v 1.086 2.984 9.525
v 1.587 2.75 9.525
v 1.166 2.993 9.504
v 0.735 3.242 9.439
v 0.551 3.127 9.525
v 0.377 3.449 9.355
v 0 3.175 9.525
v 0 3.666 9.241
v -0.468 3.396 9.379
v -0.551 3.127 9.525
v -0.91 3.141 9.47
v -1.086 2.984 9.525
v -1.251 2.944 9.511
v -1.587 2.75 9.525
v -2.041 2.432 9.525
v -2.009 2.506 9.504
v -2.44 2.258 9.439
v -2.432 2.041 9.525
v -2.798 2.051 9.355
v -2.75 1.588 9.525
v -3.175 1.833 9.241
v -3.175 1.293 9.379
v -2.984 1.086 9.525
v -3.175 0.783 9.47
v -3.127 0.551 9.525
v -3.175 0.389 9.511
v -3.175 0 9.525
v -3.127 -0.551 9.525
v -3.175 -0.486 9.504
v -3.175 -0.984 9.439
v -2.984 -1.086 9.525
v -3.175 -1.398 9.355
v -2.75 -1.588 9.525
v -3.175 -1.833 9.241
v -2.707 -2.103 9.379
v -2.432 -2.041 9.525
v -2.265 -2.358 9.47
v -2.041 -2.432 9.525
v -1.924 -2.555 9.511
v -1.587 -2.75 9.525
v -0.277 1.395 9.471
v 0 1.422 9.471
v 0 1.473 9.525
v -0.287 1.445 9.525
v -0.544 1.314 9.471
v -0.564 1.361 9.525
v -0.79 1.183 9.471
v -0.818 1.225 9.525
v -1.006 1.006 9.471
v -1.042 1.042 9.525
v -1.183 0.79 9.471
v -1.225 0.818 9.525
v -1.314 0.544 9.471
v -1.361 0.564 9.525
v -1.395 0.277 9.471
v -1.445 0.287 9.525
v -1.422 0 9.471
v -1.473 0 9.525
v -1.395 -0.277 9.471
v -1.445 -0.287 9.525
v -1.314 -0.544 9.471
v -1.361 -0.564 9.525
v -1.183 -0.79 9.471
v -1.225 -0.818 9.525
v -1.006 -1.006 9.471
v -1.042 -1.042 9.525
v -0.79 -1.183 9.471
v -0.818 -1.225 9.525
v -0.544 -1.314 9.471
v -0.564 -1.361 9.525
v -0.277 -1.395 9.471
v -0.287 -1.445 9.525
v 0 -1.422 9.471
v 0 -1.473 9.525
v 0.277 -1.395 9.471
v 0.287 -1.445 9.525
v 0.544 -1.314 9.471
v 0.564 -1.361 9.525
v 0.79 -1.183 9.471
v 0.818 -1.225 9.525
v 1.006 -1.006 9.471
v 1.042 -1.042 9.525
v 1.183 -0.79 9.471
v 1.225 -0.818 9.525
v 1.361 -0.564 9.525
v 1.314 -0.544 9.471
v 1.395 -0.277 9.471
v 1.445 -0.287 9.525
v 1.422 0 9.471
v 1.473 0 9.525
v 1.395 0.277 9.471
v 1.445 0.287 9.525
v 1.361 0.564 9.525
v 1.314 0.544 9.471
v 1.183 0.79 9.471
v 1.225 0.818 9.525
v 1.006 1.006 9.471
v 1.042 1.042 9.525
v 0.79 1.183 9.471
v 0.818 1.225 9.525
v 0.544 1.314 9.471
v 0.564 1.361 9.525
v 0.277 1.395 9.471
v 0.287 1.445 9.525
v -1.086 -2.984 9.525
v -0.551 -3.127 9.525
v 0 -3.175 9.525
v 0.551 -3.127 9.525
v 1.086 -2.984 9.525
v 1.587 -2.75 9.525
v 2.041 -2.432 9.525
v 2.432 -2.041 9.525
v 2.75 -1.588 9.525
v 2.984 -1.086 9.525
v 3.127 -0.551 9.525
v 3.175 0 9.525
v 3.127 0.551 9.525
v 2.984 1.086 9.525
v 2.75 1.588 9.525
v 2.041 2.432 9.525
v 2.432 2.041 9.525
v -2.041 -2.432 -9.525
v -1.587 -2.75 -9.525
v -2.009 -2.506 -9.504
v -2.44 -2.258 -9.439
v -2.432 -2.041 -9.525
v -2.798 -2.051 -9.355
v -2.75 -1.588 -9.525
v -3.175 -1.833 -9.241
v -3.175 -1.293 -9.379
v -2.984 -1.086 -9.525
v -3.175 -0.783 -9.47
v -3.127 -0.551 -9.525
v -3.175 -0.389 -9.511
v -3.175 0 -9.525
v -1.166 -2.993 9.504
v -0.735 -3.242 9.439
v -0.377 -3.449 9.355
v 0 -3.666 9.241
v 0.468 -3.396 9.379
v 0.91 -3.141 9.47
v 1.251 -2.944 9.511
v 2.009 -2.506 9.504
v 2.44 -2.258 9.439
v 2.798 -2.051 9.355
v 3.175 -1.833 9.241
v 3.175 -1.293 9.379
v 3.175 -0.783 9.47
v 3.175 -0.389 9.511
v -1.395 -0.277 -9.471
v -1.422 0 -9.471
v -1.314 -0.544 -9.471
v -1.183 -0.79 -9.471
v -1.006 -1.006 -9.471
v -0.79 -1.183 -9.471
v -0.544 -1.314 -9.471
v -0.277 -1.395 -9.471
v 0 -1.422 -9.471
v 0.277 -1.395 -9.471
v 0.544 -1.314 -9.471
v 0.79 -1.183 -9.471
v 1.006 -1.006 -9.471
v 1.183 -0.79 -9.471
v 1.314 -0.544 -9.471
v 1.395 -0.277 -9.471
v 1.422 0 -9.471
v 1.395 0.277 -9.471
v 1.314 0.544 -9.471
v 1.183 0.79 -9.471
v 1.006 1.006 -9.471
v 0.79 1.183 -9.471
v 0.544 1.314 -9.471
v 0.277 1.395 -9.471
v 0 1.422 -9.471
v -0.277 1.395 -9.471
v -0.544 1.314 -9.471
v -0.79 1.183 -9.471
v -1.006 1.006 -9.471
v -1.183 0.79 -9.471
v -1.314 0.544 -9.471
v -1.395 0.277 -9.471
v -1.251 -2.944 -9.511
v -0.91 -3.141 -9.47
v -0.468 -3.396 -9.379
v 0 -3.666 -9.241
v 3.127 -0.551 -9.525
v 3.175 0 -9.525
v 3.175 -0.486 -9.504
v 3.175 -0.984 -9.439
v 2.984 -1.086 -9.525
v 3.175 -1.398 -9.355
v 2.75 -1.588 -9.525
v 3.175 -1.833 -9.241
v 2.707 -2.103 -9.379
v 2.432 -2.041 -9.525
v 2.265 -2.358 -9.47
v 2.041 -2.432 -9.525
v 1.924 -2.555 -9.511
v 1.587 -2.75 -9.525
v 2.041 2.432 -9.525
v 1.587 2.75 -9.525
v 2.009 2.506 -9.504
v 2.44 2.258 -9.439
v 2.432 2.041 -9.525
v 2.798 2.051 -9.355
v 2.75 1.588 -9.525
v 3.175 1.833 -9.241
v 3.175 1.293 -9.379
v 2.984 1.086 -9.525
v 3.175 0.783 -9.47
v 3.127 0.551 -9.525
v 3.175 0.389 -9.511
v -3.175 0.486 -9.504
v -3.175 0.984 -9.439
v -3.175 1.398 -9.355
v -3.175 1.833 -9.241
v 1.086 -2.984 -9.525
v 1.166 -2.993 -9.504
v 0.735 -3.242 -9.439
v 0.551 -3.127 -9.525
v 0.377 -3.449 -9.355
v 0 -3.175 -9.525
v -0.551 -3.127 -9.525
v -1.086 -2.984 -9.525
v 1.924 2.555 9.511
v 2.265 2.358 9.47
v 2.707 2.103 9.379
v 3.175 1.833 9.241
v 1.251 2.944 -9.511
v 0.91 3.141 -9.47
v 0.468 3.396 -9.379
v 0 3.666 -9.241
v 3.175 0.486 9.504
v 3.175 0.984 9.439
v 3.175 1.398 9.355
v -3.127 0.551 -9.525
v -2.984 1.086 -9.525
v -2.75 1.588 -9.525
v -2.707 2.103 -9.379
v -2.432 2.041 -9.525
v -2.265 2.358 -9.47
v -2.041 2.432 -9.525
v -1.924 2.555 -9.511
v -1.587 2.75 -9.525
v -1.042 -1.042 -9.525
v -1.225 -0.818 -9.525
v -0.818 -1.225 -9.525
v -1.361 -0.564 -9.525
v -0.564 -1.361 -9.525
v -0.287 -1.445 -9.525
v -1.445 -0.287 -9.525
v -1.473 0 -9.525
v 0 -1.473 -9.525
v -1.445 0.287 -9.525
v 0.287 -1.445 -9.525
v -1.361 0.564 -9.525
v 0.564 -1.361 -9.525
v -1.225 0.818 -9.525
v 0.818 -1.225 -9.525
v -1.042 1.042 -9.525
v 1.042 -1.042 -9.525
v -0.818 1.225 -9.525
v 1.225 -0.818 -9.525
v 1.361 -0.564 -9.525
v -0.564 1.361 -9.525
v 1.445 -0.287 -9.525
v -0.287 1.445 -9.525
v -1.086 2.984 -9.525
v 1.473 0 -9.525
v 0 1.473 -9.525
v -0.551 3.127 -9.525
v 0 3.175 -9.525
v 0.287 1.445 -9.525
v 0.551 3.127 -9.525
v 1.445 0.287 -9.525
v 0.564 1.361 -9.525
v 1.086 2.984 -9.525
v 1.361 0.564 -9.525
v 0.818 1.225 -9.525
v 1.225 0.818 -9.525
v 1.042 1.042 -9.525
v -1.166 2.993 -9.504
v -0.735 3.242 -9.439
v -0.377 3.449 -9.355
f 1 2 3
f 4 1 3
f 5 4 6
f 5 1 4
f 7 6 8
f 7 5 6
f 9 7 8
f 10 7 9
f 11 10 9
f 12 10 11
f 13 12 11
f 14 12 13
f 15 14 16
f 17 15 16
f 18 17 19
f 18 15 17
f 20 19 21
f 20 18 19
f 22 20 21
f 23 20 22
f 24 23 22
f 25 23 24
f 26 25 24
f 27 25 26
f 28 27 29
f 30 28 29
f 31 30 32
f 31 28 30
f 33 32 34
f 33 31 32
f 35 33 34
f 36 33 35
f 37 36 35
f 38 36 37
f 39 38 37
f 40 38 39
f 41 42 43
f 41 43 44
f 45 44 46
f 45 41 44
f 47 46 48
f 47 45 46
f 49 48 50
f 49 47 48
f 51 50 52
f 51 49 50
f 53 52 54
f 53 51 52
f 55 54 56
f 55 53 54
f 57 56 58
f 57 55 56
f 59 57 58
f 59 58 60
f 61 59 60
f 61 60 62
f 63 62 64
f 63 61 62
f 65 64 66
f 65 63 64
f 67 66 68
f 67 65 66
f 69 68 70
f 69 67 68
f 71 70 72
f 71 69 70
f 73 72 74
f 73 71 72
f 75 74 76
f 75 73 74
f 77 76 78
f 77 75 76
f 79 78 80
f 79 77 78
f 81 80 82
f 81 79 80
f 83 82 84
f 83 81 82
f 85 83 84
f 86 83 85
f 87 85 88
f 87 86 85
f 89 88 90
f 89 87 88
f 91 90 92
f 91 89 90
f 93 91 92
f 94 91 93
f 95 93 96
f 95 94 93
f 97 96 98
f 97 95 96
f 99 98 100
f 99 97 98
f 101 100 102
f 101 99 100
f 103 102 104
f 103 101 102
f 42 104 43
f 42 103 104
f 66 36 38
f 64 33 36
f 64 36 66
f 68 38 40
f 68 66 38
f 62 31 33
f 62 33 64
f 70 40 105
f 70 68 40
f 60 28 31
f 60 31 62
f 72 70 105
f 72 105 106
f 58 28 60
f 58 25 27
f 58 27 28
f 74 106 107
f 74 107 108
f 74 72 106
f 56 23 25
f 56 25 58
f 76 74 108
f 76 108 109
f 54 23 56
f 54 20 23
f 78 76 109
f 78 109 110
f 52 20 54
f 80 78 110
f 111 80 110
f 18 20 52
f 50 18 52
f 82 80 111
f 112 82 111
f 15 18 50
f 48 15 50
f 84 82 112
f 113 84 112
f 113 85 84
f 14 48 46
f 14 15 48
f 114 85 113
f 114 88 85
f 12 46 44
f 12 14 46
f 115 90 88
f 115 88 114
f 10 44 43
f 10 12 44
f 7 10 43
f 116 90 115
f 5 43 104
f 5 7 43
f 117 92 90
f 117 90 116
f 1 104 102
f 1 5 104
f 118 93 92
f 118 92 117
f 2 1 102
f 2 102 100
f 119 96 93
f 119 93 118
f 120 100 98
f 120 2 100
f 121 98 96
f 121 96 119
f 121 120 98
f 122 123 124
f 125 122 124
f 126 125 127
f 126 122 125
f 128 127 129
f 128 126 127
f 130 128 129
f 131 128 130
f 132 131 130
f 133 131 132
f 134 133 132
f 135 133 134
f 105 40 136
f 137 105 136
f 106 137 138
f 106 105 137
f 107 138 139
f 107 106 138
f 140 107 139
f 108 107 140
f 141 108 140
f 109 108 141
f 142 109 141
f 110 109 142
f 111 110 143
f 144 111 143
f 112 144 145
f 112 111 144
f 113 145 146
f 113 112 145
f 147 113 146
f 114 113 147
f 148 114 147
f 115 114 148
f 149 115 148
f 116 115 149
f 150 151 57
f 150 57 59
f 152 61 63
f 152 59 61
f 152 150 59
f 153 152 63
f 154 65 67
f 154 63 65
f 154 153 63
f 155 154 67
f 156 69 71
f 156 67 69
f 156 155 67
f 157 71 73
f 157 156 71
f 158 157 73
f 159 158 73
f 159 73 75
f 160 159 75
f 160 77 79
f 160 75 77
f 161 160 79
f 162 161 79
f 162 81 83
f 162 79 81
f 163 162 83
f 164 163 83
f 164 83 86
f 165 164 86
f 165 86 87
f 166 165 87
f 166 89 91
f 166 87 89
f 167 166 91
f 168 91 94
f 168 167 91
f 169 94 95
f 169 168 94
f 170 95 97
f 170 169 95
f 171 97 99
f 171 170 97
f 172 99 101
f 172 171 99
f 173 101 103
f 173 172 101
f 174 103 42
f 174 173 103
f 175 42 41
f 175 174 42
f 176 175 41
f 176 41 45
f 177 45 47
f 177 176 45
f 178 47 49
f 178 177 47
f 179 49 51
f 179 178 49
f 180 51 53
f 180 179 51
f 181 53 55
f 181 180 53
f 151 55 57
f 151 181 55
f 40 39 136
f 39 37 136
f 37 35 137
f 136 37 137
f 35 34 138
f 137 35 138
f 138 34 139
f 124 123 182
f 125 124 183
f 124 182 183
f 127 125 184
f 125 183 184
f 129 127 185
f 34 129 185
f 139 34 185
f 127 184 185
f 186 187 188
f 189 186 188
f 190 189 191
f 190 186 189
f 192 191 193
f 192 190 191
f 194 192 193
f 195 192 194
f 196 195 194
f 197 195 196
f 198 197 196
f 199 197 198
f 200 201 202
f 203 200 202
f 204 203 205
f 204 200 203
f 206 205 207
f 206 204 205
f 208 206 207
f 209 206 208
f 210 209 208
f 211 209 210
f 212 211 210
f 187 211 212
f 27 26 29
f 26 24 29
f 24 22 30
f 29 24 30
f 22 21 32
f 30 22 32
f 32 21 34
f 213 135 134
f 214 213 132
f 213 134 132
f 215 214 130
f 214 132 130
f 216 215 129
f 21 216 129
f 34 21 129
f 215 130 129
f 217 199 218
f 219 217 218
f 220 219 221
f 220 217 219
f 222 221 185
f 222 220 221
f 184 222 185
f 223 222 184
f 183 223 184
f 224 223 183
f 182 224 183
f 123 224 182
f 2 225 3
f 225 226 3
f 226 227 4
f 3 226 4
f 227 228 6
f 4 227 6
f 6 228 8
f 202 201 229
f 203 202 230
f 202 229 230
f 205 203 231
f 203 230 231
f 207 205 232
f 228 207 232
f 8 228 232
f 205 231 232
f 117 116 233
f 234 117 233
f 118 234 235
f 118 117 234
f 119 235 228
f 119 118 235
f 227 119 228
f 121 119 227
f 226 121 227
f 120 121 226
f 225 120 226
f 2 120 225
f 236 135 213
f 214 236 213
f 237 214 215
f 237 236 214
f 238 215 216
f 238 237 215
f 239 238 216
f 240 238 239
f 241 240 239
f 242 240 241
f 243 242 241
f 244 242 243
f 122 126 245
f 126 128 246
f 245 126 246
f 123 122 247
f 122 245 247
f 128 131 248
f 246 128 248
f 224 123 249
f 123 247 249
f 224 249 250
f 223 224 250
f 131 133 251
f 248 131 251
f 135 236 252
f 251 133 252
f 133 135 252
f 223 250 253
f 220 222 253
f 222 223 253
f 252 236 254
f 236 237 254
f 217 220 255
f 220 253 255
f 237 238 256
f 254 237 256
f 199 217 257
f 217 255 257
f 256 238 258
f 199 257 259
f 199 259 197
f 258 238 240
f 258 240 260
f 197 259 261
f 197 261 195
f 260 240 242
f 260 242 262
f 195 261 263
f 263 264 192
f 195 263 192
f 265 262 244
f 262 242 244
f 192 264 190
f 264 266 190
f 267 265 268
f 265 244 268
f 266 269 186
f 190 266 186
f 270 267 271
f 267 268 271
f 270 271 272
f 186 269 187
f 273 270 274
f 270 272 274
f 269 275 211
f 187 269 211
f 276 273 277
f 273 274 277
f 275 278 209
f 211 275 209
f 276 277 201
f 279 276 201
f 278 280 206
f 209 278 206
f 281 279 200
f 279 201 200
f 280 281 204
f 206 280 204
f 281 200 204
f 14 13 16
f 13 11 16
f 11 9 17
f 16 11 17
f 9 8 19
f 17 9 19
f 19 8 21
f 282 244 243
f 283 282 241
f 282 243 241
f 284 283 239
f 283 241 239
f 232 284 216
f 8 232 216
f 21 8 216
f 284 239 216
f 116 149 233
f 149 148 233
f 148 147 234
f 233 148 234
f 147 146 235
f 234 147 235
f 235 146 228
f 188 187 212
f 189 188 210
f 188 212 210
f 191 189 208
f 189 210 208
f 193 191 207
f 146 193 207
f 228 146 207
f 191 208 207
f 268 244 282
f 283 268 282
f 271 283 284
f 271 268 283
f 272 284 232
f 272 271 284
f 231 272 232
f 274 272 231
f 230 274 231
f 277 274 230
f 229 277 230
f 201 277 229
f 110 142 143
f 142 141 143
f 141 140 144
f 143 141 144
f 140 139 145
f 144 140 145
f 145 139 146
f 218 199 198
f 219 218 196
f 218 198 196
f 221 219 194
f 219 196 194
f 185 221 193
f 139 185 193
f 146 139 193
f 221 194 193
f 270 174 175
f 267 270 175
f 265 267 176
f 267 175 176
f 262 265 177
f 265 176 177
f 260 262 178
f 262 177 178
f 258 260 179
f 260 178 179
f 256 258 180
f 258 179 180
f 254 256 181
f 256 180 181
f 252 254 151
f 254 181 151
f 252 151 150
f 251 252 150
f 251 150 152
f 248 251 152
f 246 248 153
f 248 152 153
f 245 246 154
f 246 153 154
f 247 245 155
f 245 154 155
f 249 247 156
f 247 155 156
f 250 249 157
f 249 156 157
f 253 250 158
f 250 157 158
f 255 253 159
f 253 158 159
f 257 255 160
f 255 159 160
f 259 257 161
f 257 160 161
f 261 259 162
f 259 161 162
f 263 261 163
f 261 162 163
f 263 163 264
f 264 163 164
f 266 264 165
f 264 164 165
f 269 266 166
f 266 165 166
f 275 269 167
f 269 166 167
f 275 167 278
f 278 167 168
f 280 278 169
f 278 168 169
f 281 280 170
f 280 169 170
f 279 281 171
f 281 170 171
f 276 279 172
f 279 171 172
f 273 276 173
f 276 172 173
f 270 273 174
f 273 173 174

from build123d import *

# Parameters (mm, degrees)
EXTRUDE1_DEPTH          = 9.525
EXTRUDE1_DEPTH_BACK     = 9.525
SKETCH1_R               = 1.4224
SKETCH8_OUTSIDE_W       = 84.186
SKETCH8_OUTSIDE_H       = 85.168
SKETCH8_OUTSIDE_R       = 3.175
EXTRUDE4_DEPTH          = 20.657669199
EXTRUDE4_DRAFT          = -60
MIRROR1_COPY_1_SKETCH_W = 84.186
MIRROR1_COPY_1_SKETCH_H = 85.168
MIRROR1_COPY_1_SKETCH_R = 3.175
MIRROR1_COPY_1_DEPTH    = 20.657669199
MIRROR1_COPY_1_DRAFT    = -60


with BuildPart() as part:
    # Sketch1 → Extrude1 (new, two sides: drawn at the far end of the back side and taken through both)
    with BuildSketch(Plane.XY.offset(-EXTRUDE1_DEPTH_BACK)):
        Polygon((0, 3.666174209), (-3.175, 1.833087105), (-3.175, -1.833087105), (0, -3.666174209), (3.175, -1.833087105), (3.175, 1.833087105), align=None)
        with Locations(Location((0, 0, 0), (0, 0, 180))):
            Circle(SKETCH1_R, mode=Mode.SUBTRACT)
    extrude(amount=EXTRUDE1_DEPTH + EXTRUDE1_DEPTH_BACK)

    # Extrude3 cone 1 section (through the dimple's axis) → Extrude3 (revolve, cut)
    with BuildSketch(Plane(origin=(0, 0, -9.525), x_dir=(0, 1, 0), z_dir=(1, 0, 0))):
        Polygon((0, 0), (1.4732, 0), (0, 1.579813584), align=None)
    extrude3 = revolve(axis=Axis((0, 0, -9.525), (0, 0, 1)), mode=Mode.SUBTRACT)


with BuildPart() as extrude4_tool:
    # Sketch8 outside → Extrude4 (with draft: the straight prism first)
    with BuildSketch(Plane(origin=(0, 0, -9.525), x_dir=(-1, 0, 0), z_dir=(0, 0, -1))):
        Rectangle(SKETCH8_OUTSIDE_W, SKETCH8_OUTSIDE_H)
        Circle(SKETCH8_OUTSIDE_R, mode=Mode.SUBTRACT)
    extrude(amount=-EXTRUDE4_DEPTH)
    # Extrude4: the draft: its side faces are tilted about the plane it starts from
    extrude4_sides = [extrude4_tool.faces().sort_by_distance(p)[0] for p in [
        (0, -42.584, 0.803834599),
        (-42.093, 0, 0.803834599),
        (0, 42.584, 0.803834599),
        (42.093, 0, 0.803834599),
        (3.175, 0, 0.803834599),
    ]]
    draft(extrude4_sides, Plane(origin=(0, 0, -9.525), x_dir=(-1, 0, 0), z_dir=(0, 0, -1)), EXTRUDE4_DRAFT)


with BuildPart() as part_1:
    add(part.part)

    # Extrude4: cut by extrude4_tool
    add(extrude4_tool.part, mode=Mode.SUBTRACT)

    # Mirror1: Extrude3 across plane
    add(extrude3.mirror(Plane.XY), mode=Mode.SUBTRACT)


with BuildPart() as mirror1_copy_1_tool:
    # Mirror1 copy 1 sketch → Mirror1 copy 1 (with draft: the straight prism first)
    with BuildSketch(Plane(origin=(0, 0, 9.525), x_dir=(-1, 0, 0), z_dir=(0, 0, 1))):
        Rectangle(MIRROR1_COPY_1_SKETCH_W, MIRROR1_COPY_1_SKETCH_H)
        Circle(MIRROR1_COPY_1_SKETCH_R, mode=Mode.SUBTRACT)
    extrude(amount=-MIRROR1_COPY_1_DEPTH)
    # Mirror1 copy 1: the draft: its side faces are tilted about the plane it starts from
    mirror1_copy_1_sides = [mirror1_copy_1_tool.faces().sort_by_distance(p)[0] for p in [
        (0, -42.584, -0.803834599),
        (-42.093, 0, -0.803834599),
        (0, 42.584, -0.803834599),
        (42.093, 0, -0.803834599),
        (3.175, 0, -0.803834599),
    ]]
    draft(mirror1_copy_1_sides, Plane(origin=(0, 0, 9.525), x_dir=(-1, 0, 0), z_dir=(0, 0, 1)), MIRROR1_COPY_1_DRAFT)


with BuildPart() as part_2:
    add(part_1.part)

    # Mirror1 copy 1: cut by mirror1_copy_1_tool
    add(mirror1_copy_1_tool.part, mode=Mode.SUBTRACT)


solid = part_2.part
